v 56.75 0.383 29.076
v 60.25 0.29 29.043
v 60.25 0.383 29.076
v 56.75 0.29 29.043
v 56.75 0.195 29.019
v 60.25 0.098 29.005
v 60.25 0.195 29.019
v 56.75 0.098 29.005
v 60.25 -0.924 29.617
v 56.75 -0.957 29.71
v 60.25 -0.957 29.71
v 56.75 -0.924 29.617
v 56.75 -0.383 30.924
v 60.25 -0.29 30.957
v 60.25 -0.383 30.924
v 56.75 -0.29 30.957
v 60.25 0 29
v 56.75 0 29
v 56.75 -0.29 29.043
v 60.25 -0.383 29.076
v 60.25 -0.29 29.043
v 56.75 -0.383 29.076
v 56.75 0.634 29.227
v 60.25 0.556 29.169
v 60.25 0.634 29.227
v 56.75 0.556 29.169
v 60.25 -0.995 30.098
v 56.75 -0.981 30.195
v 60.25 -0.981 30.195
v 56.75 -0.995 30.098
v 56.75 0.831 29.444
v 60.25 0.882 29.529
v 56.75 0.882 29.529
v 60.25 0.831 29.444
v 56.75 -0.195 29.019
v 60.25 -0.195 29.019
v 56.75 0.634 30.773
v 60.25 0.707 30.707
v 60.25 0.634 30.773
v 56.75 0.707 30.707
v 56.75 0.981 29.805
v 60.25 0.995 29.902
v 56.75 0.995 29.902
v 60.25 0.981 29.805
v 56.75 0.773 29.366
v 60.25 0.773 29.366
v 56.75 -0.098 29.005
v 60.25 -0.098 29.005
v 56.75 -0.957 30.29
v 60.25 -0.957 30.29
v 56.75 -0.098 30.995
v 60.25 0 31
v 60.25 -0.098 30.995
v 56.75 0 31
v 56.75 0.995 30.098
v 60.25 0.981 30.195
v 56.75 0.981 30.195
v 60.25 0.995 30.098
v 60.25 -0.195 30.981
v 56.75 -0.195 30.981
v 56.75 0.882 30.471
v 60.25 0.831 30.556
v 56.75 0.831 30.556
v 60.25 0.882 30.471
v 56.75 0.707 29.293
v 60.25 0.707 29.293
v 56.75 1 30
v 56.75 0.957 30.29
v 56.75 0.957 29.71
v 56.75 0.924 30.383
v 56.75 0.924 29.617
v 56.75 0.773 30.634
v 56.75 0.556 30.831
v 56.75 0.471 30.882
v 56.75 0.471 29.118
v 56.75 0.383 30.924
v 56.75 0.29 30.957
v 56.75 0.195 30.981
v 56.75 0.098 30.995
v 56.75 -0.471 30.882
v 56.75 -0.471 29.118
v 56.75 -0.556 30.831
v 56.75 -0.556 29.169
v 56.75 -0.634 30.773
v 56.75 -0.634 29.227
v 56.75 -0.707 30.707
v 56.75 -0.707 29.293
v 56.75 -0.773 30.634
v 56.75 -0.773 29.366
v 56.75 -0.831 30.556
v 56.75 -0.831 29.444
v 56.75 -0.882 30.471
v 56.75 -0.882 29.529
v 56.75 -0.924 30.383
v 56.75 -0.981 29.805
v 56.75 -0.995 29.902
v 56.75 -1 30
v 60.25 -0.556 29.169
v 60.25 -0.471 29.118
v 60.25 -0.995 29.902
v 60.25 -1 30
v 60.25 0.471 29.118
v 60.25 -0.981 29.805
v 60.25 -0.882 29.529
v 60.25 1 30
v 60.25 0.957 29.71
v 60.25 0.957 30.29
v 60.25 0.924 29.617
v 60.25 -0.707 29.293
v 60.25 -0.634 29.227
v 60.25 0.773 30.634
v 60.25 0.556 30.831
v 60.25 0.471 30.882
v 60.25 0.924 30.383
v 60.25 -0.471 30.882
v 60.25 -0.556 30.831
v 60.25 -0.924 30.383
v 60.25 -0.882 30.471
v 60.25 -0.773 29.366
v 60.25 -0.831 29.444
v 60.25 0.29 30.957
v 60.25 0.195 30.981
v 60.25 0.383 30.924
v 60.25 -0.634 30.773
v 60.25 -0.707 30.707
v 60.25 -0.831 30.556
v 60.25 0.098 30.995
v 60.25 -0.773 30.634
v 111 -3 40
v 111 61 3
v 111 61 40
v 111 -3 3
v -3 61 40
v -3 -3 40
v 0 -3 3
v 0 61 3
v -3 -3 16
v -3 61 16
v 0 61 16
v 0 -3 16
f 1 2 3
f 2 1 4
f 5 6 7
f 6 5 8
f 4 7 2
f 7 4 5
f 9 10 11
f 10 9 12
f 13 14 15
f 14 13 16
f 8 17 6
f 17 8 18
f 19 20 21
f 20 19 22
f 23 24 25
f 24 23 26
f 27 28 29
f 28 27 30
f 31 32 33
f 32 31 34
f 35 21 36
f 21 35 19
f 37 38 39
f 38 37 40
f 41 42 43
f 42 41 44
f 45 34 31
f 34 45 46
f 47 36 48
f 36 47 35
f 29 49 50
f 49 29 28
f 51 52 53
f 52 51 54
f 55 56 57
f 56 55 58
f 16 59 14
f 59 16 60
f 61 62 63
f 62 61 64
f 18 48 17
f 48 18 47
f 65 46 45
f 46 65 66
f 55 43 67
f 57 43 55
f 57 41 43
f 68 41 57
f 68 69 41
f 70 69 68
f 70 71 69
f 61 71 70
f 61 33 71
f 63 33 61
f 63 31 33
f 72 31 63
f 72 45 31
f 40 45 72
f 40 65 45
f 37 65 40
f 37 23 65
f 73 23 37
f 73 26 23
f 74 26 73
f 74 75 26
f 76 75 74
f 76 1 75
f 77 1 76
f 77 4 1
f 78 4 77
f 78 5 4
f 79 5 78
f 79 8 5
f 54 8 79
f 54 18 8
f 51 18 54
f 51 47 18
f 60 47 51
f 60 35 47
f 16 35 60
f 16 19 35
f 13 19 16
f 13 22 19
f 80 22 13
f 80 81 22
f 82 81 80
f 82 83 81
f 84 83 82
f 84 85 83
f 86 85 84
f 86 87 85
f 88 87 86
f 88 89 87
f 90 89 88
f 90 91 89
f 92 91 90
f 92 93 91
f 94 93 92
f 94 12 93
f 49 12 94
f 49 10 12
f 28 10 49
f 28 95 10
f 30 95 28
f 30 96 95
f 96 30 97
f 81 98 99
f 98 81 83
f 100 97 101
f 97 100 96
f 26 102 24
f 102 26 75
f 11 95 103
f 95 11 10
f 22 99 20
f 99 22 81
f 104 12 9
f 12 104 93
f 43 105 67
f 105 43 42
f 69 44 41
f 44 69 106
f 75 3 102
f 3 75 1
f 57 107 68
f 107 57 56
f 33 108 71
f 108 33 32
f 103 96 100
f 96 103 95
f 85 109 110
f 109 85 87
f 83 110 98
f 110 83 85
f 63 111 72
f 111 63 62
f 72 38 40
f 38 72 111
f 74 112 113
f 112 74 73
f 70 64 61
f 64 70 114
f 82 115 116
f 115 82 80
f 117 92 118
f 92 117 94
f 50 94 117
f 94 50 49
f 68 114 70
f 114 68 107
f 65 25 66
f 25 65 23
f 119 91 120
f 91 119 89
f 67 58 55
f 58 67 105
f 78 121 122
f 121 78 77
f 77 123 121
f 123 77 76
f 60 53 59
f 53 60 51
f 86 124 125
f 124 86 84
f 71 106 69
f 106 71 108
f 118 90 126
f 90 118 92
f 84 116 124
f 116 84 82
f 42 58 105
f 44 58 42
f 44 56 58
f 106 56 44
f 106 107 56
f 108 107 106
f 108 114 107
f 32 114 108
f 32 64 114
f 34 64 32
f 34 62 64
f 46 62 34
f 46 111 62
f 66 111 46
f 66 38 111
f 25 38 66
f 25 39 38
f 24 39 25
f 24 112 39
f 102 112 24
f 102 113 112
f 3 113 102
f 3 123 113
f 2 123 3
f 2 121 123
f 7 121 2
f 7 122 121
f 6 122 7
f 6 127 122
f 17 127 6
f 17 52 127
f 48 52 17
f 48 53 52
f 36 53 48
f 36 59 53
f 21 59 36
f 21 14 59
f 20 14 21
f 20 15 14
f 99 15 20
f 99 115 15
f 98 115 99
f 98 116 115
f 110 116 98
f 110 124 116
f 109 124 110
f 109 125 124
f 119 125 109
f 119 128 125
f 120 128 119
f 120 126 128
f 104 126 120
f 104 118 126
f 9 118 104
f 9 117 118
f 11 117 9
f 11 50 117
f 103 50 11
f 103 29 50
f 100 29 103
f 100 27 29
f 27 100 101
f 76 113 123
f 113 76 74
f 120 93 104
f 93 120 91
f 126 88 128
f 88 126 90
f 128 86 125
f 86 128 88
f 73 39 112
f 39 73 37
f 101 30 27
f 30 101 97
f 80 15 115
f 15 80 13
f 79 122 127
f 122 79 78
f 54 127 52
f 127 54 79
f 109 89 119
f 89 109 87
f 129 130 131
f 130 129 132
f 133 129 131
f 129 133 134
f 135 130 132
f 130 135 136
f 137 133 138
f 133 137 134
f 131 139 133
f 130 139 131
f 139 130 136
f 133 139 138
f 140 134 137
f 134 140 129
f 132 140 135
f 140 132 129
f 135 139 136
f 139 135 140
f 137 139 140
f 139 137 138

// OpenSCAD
// Mini horizontal gel-electrophoresis buffer tank
// Print orientation: open top facing up, floor on the bed (z = 0)

// ---------------- Parameters ----------------
tank_x      = 120;   // outer length along X (mm)
tank_y      = 70;    // outer width along Y (mm)
tank_z      = 40;    // outer height along Z (mm)

wall        = 3;     // wall thickness (mm)
floor       = 3;     // floor thickness (mm)

platform_x  = 60;    // platform length along X (mm), centred
platform_w  = tank_y; // platform width along Y (full inner width)
platform_top = 13;   // height of platform top above outer floor (mm)

hole_d      = 2;     // electrode hole diameter (mm)
hole_y      = 0;     // electrode hole Y position (mm)
hole_z      = 30;    // electrode hole height above outer floor (mm)

eps         = 0.5;   // cutter overshoot past faces (mm)

$fn = 64;

// ---------------- Derived ----------------
inner_x = tank_x - 2 * wall;   // inner length (X)
inner_y = tank_y - 2 * wall;   // inner width (Y)
inner_z = tank_z - floor;      // inner height above floor (Z)

// ---------------- Model ----------------
difference() {
    // Outer tank shell (open top)
    translate([-wall, -wall, floor])
        cube([inner_x, inner_y, tank_z - floor]);

    // Central raised platform for gel tray
    translate([-wall, -wall, floor])
        cube([wall, platform_w, platform_top]);

    // Electrode holes through each end wall, along X
    for (s = [-1, 1])
        translate([s * (tank_x / 2 - wall / 2), hole_y, hole_z])
            rotate([0, 90, 0])
                cylinder(d = hole_d, h = wall + eps, center = true);
}
